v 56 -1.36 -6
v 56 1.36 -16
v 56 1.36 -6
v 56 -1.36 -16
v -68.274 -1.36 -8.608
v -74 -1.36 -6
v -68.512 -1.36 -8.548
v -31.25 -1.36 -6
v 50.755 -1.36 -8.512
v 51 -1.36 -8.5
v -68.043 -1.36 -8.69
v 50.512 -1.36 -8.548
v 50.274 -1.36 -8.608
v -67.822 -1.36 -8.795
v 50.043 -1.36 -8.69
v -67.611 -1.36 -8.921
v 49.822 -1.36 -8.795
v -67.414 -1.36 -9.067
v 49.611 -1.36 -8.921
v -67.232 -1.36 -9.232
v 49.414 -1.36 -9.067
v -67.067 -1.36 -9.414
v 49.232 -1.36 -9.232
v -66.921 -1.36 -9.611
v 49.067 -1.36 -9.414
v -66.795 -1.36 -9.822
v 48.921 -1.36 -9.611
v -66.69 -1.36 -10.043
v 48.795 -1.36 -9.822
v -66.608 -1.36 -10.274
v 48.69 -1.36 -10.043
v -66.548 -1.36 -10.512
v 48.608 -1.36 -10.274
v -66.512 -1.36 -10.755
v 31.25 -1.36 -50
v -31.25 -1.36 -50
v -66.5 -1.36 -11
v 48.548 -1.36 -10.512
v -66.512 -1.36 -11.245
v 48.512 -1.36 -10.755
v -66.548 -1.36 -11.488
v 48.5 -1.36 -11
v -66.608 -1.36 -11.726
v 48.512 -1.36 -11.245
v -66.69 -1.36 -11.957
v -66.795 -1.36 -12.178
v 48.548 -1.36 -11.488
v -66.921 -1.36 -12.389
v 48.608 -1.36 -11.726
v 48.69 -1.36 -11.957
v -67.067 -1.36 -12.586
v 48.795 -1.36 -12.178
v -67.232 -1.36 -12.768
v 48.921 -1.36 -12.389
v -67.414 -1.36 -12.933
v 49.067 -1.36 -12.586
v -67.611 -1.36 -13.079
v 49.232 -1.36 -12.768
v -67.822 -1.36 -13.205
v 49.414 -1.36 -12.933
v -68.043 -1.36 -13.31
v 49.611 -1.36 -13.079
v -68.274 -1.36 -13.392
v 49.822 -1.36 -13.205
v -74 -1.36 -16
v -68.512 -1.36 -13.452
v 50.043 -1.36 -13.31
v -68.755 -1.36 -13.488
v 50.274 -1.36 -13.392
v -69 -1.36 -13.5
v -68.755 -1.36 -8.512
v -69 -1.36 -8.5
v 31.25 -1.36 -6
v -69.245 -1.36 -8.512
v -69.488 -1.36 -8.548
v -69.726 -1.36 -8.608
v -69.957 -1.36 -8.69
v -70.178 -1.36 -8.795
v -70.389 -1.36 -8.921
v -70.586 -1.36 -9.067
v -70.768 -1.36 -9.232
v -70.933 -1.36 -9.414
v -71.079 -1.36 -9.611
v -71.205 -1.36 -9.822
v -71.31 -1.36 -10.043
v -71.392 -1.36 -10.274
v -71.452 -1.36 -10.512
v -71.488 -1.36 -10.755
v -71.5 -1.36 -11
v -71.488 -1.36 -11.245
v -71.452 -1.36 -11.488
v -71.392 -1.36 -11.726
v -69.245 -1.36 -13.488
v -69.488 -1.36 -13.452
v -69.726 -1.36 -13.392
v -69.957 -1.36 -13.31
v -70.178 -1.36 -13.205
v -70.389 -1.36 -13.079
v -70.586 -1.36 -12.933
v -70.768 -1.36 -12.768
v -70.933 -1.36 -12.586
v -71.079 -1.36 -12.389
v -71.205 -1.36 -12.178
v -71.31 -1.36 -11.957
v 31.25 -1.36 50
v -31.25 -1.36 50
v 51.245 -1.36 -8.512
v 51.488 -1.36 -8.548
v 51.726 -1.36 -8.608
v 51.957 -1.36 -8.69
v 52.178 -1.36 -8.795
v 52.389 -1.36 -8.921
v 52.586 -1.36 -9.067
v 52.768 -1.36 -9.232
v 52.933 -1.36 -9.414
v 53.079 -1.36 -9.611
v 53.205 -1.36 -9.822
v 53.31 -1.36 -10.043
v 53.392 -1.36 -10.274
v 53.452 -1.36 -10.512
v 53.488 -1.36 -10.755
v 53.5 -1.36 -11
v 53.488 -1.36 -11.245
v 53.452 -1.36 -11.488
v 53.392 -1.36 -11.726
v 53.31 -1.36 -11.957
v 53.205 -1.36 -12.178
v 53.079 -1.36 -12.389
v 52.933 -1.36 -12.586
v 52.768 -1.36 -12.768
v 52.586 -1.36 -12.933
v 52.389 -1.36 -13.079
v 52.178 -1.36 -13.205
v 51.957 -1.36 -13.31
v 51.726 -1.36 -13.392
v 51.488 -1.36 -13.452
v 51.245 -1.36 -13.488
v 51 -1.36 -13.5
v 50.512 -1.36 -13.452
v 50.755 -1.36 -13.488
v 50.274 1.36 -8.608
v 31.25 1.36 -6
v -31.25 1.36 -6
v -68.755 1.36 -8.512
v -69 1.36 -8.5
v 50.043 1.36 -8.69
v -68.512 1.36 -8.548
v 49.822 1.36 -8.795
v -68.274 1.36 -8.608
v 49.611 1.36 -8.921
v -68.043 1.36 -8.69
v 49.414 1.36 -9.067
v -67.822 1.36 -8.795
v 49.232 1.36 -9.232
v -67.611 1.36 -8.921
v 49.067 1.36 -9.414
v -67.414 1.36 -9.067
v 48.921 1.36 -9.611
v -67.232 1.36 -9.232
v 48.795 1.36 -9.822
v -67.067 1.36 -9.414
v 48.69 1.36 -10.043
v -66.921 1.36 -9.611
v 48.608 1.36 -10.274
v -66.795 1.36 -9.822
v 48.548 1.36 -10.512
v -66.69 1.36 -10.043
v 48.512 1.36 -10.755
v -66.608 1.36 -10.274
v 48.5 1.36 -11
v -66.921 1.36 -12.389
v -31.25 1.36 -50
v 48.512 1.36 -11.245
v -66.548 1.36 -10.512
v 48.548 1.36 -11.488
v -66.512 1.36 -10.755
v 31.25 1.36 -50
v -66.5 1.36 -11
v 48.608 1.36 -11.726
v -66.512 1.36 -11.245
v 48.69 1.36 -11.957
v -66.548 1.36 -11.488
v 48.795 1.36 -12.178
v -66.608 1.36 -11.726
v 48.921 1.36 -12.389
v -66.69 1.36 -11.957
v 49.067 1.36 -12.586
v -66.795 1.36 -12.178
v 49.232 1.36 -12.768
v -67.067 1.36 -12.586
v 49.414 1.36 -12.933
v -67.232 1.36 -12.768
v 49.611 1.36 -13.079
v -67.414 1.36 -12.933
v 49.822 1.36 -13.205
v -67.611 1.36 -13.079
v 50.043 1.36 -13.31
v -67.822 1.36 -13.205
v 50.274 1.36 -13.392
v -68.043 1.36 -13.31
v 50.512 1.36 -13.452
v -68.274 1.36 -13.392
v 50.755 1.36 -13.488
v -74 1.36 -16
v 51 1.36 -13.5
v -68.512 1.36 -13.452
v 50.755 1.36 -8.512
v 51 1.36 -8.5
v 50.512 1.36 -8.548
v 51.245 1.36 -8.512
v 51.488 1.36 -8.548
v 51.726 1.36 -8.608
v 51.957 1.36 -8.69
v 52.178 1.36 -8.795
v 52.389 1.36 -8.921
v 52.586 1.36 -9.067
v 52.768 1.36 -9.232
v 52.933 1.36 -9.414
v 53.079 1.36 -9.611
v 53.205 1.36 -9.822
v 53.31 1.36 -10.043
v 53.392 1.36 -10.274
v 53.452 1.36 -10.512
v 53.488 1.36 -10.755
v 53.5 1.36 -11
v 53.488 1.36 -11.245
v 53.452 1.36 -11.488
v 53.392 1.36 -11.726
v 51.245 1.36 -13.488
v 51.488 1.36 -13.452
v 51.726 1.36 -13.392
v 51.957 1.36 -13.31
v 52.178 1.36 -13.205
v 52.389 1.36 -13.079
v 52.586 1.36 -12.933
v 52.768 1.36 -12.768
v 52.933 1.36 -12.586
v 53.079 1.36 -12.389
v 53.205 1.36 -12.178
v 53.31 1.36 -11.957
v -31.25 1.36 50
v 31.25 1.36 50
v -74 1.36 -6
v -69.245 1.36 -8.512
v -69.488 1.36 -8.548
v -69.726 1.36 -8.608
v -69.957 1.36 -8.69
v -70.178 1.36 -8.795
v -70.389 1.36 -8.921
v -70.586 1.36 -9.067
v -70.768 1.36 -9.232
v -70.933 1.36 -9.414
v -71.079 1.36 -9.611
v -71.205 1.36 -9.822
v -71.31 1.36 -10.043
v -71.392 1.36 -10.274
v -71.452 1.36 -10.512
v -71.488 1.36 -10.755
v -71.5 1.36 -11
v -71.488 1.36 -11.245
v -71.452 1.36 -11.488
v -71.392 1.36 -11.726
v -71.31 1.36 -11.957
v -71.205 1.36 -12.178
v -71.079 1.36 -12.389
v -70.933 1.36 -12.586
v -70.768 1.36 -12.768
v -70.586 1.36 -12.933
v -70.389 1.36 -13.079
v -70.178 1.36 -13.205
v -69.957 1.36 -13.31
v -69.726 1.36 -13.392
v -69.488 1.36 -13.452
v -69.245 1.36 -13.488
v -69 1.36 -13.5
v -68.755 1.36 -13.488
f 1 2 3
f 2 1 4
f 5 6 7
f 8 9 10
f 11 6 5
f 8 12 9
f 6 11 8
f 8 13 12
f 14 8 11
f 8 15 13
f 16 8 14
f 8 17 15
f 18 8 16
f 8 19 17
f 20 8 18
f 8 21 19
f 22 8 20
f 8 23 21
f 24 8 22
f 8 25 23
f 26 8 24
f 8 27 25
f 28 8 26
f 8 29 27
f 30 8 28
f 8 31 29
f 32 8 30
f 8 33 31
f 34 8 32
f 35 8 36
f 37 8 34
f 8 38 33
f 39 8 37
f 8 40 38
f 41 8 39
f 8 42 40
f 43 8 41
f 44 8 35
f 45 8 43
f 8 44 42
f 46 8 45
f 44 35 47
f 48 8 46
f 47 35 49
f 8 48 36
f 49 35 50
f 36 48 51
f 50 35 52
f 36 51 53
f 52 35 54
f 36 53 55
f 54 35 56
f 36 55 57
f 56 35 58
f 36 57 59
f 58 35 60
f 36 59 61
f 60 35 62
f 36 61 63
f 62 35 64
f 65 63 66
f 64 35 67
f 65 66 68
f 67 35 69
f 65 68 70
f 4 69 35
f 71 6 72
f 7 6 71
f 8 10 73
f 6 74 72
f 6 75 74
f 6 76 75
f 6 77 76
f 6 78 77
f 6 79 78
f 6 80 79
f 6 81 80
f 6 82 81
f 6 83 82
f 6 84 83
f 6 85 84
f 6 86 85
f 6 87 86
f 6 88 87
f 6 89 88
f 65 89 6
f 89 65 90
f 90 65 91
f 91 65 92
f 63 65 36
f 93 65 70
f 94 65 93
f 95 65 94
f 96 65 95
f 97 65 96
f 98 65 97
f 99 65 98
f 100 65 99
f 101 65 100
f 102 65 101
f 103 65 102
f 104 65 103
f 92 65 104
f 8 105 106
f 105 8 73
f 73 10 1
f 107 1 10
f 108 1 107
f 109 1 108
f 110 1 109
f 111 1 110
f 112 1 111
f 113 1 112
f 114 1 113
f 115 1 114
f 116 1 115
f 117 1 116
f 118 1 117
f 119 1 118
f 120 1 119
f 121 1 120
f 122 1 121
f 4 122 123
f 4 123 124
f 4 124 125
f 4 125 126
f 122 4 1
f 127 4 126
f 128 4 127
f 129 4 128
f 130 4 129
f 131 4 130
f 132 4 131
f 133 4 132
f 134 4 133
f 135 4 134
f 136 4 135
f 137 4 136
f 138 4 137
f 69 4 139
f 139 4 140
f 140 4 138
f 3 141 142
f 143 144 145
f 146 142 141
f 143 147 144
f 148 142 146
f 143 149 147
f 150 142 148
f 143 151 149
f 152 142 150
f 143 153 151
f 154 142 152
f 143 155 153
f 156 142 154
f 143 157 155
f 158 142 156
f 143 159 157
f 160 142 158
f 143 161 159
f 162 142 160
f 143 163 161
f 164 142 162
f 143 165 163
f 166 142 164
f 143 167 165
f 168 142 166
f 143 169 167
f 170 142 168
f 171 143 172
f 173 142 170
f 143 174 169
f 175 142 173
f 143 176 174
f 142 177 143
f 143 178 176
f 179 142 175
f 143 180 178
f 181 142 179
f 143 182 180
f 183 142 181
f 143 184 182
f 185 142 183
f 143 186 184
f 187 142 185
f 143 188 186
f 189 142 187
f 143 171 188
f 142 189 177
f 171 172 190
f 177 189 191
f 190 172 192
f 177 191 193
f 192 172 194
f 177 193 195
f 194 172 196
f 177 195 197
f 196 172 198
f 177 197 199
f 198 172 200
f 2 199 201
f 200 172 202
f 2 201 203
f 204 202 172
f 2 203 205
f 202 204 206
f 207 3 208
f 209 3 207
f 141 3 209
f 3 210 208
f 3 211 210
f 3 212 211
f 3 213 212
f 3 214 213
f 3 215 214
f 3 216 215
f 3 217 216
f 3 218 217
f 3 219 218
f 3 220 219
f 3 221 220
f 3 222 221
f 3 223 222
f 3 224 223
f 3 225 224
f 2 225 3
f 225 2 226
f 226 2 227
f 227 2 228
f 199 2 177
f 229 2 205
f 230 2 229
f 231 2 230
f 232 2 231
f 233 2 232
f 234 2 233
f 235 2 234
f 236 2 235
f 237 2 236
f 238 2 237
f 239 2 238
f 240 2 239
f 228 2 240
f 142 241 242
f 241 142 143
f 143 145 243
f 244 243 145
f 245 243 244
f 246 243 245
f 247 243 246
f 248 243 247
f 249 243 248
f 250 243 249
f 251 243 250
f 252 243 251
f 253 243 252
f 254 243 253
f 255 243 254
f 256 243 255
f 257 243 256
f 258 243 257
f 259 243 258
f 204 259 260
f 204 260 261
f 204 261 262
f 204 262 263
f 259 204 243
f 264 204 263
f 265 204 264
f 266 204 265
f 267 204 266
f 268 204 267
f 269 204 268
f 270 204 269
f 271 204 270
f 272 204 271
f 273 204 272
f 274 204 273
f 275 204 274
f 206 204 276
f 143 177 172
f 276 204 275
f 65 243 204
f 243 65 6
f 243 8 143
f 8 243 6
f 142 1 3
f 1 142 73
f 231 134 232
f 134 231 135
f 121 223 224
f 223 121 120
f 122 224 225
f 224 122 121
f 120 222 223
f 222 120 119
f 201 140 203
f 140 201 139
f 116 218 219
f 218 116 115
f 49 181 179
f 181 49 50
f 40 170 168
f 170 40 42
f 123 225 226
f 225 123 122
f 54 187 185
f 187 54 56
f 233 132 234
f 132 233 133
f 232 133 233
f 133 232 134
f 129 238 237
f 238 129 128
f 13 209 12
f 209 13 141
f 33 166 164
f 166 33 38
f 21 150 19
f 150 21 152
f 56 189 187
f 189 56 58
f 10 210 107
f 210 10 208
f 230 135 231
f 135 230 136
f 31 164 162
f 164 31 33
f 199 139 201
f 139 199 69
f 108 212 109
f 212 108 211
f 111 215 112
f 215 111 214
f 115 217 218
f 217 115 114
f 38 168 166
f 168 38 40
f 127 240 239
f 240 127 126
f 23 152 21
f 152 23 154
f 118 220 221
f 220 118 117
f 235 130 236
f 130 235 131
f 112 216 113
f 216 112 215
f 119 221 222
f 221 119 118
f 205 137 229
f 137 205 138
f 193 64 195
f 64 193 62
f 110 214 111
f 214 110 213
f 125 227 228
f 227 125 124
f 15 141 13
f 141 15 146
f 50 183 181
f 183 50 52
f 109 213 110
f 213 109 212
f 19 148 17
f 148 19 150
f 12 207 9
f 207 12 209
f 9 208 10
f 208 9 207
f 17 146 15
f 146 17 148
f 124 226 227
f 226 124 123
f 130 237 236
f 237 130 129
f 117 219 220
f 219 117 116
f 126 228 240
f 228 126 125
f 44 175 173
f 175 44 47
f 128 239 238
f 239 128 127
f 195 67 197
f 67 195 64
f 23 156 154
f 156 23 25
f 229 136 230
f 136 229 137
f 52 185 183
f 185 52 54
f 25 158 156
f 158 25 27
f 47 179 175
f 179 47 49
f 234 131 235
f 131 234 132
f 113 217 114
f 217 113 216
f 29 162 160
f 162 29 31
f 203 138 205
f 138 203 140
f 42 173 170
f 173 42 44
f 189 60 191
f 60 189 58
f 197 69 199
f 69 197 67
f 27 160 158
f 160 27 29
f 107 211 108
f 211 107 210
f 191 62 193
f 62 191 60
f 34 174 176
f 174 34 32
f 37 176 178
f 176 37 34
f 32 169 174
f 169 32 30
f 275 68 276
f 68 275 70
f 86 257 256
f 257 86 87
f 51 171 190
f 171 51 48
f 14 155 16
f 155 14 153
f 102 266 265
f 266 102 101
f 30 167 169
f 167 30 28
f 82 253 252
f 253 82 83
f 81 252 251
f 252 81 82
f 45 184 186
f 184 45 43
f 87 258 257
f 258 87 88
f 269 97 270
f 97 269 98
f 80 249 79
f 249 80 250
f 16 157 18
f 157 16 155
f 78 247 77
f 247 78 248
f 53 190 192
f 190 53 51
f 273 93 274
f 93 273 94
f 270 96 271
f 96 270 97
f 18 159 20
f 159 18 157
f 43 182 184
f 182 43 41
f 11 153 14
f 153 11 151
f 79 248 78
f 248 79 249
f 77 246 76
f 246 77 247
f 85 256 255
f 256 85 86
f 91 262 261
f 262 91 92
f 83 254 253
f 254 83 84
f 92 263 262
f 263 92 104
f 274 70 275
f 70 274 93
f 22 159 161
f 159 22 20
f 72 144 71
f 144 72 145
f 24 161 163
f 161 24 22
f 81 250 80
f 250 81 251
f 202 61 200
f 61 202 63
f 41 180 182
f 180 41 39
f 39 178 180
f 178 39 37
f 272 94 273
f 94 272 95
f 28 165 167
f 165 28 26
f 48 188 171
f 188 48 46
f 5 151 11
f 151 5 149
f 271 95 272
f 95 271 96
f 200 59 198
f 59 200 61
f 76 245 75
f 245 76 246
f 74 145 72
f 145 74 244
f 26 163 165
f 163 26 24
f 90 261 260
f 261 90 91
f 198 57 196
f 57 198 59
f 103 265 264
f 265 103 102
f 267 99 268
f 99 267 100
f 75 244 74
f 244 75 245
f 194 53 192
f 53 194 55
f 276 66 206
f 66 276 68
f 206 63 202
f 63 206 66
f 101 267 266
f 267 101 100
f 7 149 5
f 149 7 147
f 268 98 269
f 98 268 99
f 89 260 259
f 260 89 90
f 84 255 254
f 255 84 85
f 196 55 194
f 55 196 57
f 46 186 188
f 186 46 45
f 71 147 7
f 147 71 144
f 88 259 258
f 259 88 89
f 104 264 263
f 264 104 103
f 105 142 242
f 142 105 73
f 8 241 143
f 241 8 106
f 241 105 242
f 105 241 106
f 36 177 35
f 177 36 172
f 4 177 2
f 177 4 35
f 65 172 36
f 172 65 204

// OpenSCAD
// file: prism.scad
//right angled triangle
//l - length of prism
//w - width of triangle
//h - height of triangle
//From https://github.com/orionrobots/openscad_parts_library/blob/master/prism.scad
module prism(l, w, h) {
       polyhedron(points=[
               [0,0,h],           // 0    front top corner
               [0,0,0],[w,0,0],   // 1, 2 front left & right bottom corners
               [0,l,h],           // 3    back top corner
               [0,l,0],[w,l,0]    // 4, 5 back left & right bottom corners
       ], faces=[ // points for all faces must be ordered clockwise when looking in
               [0,2,1],    // top face
               [3,4,5],    // base face
               [0,1,4,3],  // h face
               [1,2,5,4],  // w face
               [0,3,5,2],  // hypotenuse face
       ]);
}
// main file
use <prism.scad>

$fn=64;

thickness=1;
height=3.72-thickness;
ctrlWidth=60.5;
screwHole=5;
screwMargin=2*screwHole;
holeDistance=120;
barFromTop=56;
barX=-9;
plateWidth=ctrlWidth+2*thickness;


module bmx(length=70)
{
    cube([plateWidth,length, height],center=true);

    barY=length/2-screwMargin/2-barFromTop;    
    difference()
    {
        translate([barX,barY,0])cube([holeDistance+screwMargin,screwMargin,height],center=true);
        translate([barX+60,barY,0])cylinder(d=screwHole,h=2*height,center=true);
        translate([barX-60,barY,0])cylinder(d=screwHole,h=2*height,center=true);
    }
    rightPrismX=(holeDistance+screwMargin-plateWidth)/2+barX;
    leftPrismX=(holeDistance+screwMargin-plateWidth)/2-barX;
    rightPrismY=length/2+barY-screwMargin/2;
    leftPrismY=length/2+barY-screwMargin/2;
    translate([plateWidth/2,barY-screwMargin/2,-height/2])rotate([90,0,0])prism(height,rightPrismX,rightPrismY);
    translate([-plateWidth/2,barY-screwMargin/2,+height/2])rotate([90,180,0])prism(height,leftPrismX,leftPrismY);
}

module basemount(length=70)
{
    rotate([90,0,0])bmx(length);
}

basemount(100);
